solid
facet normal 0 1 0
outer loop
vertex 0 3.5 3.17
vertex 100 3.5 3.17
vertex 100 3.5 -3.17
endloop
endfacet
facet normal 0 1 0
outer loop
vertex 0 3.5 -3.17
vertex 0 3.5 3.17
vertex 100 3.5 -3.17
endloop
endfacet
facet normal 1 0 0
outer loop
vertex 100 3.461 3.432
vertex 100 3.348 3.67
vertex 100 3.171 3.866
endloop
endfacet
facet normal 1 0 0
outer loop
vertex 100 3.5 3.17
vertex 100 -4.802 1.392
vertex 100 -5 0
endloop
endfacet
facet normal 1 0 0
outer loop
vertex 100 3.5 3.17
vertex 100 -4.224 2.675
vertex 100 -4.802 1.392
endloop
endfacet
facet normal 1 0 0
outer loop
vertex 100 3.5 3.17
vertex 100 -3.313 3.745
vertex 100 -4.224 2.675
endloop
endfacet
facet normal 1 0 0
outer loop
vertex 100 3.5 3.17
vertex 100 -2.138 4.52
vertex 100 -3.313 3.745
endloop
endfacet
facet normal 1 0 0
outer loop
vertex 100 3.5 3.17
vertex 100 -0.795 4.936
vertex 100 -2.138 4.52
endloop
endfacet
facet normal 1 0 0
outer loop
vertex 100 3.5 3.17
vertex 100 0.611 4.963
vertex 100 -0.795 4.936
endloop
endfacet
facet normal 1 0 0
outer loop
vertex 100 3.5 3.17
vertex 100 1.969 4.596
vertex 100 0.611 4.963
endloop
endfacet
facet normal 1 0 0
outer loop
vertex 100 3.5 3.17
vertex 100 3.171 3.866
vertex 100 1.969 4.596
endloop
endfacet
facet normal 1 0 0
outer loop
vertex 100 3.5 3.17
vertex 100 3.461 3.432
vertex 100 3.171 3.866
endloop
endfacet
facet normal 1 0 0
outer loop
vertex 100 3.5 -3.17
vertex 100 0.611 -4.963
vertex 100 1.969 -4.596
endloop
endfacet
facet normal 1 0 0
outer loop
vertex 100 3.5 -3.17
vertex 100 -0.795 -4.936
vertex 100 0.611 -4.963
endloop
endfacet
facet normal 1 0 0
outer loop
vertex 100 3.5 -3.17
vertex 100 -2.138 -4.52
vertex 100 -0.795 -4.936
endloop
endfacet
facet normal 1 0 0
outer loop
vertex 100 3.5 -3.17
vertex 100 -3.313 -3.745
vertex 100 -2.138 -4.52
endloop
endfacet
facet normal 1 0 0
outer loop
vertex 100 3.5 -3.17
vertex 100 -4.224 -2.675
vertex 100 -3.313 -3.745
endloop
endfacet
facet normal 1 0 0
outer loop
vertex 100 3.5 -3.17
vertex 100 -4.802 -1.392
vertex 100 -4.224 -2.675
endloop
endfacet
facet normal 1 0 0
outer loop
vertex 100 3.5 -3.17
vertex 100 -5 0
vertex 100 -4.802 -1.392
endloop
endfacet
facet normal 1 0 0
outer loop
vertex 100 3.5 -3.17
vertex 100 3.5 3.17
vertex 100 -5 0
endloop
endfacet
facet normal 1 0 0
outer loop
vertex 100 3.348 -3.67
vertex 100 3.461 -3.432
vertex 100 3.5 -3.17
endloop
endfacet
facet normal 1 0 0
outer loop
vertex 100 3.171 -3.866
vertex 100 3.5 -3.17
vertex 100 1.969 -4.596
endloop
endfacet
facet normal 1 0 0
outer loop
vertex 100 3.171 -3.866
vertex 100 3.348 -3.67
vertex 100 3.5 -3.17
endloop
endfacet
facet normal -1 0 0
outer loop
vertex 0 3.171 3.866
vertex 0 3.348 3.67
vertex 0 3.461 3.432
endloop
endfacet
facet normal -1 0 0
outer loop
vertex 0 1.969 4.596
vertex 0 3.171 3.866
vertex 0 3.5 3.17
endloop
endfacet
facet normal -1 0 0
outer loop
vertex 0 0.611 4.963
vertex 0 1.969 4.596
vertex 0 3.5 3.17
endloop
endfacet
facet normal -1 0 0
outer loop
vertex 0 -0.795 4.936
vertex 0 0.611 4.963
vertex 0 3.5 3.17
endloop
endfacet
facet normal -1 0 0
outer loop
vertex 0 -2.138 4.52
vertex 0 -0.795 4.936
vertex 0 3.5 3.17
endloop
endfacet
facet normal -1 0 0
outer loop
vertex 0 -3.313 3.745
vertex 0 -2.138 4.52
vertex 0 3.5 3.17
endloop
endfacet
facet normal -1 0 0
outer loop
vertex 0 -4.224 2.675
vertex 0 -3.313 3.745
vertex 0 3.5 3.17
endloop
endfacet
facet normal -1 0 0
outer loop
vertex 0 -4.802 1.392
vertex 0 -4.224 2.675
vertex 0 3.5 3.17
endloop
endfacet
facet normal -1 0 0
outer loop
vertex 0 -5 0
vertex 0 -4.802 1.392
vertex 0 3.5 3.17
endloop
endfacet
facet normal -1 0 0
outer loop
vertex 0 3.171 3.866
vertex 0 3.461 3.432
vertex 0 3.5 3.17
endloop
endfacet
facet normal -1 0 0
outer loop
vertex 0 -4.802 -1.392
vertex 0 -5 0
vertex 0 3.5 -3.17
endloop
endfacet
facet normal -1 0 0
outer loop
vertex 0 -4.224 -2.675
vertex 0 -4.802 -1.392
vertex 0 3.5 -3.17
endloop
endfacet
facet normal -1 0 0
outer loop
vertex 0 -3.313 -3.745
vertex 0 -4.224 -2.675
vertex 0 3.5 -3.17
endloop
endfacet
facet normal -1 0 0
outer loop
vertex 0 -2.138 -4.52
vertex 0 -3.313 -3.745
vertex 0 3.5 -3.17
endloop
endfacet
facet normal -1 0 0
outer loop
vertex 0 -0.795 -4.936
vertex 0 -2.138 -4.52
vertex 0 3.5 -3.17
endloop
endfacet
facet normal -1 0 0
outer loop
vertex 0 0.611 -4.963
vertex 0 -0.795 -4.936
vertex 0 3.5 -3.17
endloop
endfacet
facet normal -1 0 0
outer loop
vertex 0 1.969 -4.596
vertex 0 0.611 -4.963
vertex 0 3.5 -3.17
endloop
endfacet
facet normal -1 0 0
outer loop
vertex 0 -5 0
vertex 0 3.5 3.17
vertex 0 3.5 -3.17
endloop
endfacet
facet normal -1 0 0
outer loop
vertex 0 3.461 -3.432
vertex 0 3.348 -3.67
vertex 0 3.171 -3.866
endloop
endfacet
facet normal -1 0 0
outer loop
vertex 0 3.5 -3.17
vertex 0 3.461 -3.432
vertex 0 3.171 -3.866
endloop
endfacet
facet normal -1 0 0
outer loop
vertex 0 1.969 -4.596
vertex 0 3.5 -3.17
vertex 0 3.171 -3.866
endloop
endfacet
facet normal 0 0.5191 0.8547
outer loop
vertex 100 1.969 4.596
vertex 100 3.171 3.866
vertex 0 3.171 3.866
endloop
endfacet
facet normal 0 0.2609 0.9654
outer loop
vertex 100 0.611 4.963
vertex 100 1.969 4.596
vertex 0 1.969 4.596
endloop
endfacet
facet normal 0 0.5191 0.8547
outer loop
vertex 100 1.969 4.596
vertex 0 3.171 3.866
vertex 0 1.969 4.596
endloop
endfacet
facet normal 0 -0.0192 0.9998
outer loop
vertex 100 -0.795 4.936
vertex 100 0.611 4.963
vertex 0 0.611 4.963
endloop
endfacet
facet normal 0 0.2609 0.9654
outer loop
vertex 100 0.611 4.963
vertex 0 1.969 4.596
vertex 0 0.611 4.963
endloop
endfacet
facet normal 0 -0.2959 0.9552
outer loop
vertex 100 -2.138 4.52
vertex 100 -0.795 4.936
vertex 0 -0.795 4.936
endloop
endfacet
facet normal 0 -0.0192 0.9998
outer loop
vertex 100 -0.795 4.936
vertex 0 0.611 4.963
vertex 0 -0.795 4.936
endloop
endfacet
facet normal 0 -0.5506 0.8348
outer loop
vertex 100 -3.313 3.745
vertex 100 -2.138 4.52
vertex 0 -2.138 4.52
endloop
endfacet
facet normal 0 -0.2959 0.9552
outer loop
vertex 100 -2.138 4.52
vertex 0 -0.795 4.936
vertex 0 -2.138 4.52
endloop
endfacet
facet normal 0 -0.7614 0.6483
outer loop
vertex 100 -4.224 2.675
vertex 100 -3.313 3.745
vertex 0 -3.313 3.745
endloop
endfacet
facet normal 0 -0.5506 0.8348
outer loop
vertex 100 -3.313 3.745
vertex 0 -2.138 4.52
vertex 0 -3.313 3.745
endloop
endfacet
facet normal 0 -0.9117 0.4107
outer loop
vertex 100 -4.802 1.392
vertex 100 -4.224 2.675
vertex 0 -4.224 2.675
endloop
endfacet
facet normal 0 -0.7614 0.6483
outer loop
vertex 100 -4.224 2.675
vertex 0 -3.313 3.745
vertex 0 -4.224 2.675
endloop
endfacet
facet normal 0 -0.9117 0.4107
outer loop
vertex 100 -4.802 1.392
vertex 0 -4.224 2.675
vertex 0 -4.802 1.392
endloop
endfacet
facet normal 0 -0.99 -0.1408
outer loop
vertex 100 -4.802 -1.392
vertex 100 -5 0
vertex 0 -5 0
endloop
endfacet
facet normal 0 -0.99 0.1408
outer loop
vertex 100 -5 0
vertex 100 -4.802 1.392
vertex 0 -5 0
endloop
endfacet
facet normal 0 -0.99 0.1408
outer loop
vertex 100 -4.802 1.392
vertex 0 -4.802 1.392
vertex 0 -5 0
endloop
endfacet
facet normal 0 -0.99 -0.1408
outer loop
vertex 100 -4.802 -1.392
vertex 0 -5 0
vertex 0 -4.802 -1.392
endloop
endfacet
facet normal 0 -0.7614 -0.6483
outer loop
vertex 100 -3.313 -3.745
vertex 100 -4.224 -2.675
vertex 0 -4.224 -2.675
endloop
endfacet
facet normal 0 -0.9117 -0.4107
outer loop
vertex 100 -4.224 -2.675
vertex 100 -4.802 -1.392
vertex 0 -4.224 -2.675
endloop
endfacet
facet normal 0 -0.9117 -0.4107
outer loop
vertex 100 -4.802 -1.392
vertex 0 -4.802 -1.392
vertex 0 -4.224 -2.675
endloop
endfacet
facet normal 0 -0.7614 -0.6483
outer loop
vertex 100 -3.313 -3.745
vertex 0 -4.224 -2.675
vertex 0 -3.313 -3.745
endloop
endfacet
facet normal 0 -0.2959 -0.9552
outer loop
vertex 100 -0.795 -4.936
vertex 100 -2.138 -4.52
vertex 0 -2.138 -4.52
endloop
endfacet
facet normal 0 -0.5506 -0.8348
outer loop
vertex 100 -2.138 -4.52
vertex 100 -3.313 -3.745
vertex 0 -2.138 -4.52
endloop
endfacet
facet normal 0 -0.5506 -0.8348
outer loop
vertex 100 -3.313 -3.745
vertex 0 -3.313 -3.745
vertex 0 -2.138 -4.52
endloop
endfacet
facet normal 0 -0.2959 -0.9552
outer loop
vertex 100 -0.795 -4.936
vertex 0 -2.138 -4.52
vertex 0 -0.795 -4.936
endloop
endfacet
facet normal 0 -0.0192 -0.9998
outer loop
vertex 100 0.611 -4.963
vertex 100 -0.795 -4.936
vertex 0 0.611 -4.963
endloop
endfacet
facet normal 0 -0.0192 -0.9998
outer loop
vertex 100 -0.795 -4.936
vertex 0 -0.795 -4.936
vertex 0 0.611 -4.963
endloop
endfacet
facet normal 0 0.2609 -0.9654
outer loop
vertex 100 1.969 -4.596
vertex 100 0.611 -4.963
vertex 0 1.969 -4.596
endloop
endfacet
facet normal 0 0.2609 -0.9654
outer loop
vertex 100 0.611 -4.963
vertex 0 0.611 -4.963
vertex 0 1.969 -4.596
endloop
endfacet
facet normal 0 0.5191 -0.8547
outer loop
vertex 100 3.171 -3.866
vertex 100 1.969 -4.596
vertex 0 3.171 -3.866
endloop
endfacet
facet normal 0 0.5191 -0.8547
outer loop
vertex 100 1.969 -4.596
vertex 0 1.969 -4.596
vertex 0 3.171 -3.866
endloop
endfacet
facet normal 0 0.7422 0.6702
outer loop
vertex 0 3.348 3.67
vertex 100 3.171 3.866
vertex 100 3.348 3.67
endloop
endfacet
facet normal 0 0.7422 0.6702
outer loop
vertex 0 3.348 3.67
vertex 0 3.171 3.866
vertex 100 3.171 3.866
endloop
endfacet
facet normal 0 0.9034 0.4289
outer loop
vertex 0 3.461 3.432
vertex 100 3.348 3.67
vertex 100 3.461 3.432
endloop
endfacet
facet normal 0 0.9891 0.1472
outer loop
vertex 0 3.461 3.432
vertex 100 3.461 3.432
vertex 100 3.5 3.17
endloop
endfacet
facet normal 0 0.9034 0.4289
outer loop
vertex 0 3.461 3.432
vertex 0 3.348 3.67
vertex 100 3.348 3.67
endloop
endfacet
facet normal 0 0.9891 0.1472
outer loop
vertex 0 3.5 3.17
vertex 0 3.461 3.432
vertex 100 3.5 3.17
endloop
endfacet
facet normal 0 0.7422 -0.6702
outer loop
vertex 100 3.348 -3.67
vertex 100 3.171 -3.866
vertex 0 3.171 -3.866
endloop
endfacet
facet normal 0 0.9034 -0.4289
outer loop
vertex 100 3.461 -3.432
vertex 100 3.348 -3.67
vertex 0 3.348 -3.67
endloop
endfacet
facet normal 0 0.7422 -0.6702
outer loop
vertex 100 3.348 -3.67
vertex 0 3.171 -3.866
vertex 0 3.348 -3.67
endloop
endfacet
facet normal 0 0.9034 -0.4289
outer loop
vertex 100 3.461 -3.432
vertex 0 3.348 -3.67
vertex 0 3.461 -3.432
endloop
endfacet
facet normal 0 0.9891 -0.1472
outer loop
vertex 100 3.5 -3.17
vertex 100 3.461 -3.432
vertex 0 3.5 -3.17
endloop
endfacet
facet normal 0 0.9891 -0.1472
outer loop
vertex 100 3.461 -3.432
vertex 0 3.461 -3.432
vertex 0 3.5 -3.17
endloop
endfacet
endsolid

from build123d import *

# Parameters (mm, degrees)
SKETCH1_R           = 5
BOSS_EXTRUDE1_DEPTH = 100
SKETCH2_W           = 5.740134486
SKETCH2_H           = 2.400249814
SKETCH2_W_2         = 4.427188802
CUT_EXTRUDE1_DEPTH  = 101
FILLET1_R           = 0.9


with BuildPart() as part:
    # Sketch1 → Boss-Extrude1 (new body)
    with BuildSketch(Plane(origin=(0, 0, 0), x_dir=(0, 0, -1), z_dir=(1, 0, 0))):
        Circle(SKETCH1_R)
    extrude(amount=BOSS_EXTRUDE1_DEPTH)

    # Sketch2 → Cut-Extrude1 (cut, through all)
    with BuildSketch(Plane(origin=(100, 0, 0), x_dir=(0, 0, -1), z_dir=(1, 0, 0))):
        with Locations((-2.870067243, 4.700124907)):
            Rectangle(SKETCH2_W, SKETCH2_H)
        with Locations((2.213594401, 4.700124907)):
            Rectangle(SKETCH2_W_2, SKETCH2_H)
    extrude(amount=-CUT_EXTRUDE1_DEPTH, mode=Mode.SUBTRACT)

    # Fillet1
    fillet1_edges = [part.edges().sort_by_distance(p)[0] for p in [
        (50, 3.5, -3.570714214),
        (50, 3.5, 3.570714214),
    ]]
    fillet(fillet1_edges, radius=FILLET1_R)


solid = part.part
